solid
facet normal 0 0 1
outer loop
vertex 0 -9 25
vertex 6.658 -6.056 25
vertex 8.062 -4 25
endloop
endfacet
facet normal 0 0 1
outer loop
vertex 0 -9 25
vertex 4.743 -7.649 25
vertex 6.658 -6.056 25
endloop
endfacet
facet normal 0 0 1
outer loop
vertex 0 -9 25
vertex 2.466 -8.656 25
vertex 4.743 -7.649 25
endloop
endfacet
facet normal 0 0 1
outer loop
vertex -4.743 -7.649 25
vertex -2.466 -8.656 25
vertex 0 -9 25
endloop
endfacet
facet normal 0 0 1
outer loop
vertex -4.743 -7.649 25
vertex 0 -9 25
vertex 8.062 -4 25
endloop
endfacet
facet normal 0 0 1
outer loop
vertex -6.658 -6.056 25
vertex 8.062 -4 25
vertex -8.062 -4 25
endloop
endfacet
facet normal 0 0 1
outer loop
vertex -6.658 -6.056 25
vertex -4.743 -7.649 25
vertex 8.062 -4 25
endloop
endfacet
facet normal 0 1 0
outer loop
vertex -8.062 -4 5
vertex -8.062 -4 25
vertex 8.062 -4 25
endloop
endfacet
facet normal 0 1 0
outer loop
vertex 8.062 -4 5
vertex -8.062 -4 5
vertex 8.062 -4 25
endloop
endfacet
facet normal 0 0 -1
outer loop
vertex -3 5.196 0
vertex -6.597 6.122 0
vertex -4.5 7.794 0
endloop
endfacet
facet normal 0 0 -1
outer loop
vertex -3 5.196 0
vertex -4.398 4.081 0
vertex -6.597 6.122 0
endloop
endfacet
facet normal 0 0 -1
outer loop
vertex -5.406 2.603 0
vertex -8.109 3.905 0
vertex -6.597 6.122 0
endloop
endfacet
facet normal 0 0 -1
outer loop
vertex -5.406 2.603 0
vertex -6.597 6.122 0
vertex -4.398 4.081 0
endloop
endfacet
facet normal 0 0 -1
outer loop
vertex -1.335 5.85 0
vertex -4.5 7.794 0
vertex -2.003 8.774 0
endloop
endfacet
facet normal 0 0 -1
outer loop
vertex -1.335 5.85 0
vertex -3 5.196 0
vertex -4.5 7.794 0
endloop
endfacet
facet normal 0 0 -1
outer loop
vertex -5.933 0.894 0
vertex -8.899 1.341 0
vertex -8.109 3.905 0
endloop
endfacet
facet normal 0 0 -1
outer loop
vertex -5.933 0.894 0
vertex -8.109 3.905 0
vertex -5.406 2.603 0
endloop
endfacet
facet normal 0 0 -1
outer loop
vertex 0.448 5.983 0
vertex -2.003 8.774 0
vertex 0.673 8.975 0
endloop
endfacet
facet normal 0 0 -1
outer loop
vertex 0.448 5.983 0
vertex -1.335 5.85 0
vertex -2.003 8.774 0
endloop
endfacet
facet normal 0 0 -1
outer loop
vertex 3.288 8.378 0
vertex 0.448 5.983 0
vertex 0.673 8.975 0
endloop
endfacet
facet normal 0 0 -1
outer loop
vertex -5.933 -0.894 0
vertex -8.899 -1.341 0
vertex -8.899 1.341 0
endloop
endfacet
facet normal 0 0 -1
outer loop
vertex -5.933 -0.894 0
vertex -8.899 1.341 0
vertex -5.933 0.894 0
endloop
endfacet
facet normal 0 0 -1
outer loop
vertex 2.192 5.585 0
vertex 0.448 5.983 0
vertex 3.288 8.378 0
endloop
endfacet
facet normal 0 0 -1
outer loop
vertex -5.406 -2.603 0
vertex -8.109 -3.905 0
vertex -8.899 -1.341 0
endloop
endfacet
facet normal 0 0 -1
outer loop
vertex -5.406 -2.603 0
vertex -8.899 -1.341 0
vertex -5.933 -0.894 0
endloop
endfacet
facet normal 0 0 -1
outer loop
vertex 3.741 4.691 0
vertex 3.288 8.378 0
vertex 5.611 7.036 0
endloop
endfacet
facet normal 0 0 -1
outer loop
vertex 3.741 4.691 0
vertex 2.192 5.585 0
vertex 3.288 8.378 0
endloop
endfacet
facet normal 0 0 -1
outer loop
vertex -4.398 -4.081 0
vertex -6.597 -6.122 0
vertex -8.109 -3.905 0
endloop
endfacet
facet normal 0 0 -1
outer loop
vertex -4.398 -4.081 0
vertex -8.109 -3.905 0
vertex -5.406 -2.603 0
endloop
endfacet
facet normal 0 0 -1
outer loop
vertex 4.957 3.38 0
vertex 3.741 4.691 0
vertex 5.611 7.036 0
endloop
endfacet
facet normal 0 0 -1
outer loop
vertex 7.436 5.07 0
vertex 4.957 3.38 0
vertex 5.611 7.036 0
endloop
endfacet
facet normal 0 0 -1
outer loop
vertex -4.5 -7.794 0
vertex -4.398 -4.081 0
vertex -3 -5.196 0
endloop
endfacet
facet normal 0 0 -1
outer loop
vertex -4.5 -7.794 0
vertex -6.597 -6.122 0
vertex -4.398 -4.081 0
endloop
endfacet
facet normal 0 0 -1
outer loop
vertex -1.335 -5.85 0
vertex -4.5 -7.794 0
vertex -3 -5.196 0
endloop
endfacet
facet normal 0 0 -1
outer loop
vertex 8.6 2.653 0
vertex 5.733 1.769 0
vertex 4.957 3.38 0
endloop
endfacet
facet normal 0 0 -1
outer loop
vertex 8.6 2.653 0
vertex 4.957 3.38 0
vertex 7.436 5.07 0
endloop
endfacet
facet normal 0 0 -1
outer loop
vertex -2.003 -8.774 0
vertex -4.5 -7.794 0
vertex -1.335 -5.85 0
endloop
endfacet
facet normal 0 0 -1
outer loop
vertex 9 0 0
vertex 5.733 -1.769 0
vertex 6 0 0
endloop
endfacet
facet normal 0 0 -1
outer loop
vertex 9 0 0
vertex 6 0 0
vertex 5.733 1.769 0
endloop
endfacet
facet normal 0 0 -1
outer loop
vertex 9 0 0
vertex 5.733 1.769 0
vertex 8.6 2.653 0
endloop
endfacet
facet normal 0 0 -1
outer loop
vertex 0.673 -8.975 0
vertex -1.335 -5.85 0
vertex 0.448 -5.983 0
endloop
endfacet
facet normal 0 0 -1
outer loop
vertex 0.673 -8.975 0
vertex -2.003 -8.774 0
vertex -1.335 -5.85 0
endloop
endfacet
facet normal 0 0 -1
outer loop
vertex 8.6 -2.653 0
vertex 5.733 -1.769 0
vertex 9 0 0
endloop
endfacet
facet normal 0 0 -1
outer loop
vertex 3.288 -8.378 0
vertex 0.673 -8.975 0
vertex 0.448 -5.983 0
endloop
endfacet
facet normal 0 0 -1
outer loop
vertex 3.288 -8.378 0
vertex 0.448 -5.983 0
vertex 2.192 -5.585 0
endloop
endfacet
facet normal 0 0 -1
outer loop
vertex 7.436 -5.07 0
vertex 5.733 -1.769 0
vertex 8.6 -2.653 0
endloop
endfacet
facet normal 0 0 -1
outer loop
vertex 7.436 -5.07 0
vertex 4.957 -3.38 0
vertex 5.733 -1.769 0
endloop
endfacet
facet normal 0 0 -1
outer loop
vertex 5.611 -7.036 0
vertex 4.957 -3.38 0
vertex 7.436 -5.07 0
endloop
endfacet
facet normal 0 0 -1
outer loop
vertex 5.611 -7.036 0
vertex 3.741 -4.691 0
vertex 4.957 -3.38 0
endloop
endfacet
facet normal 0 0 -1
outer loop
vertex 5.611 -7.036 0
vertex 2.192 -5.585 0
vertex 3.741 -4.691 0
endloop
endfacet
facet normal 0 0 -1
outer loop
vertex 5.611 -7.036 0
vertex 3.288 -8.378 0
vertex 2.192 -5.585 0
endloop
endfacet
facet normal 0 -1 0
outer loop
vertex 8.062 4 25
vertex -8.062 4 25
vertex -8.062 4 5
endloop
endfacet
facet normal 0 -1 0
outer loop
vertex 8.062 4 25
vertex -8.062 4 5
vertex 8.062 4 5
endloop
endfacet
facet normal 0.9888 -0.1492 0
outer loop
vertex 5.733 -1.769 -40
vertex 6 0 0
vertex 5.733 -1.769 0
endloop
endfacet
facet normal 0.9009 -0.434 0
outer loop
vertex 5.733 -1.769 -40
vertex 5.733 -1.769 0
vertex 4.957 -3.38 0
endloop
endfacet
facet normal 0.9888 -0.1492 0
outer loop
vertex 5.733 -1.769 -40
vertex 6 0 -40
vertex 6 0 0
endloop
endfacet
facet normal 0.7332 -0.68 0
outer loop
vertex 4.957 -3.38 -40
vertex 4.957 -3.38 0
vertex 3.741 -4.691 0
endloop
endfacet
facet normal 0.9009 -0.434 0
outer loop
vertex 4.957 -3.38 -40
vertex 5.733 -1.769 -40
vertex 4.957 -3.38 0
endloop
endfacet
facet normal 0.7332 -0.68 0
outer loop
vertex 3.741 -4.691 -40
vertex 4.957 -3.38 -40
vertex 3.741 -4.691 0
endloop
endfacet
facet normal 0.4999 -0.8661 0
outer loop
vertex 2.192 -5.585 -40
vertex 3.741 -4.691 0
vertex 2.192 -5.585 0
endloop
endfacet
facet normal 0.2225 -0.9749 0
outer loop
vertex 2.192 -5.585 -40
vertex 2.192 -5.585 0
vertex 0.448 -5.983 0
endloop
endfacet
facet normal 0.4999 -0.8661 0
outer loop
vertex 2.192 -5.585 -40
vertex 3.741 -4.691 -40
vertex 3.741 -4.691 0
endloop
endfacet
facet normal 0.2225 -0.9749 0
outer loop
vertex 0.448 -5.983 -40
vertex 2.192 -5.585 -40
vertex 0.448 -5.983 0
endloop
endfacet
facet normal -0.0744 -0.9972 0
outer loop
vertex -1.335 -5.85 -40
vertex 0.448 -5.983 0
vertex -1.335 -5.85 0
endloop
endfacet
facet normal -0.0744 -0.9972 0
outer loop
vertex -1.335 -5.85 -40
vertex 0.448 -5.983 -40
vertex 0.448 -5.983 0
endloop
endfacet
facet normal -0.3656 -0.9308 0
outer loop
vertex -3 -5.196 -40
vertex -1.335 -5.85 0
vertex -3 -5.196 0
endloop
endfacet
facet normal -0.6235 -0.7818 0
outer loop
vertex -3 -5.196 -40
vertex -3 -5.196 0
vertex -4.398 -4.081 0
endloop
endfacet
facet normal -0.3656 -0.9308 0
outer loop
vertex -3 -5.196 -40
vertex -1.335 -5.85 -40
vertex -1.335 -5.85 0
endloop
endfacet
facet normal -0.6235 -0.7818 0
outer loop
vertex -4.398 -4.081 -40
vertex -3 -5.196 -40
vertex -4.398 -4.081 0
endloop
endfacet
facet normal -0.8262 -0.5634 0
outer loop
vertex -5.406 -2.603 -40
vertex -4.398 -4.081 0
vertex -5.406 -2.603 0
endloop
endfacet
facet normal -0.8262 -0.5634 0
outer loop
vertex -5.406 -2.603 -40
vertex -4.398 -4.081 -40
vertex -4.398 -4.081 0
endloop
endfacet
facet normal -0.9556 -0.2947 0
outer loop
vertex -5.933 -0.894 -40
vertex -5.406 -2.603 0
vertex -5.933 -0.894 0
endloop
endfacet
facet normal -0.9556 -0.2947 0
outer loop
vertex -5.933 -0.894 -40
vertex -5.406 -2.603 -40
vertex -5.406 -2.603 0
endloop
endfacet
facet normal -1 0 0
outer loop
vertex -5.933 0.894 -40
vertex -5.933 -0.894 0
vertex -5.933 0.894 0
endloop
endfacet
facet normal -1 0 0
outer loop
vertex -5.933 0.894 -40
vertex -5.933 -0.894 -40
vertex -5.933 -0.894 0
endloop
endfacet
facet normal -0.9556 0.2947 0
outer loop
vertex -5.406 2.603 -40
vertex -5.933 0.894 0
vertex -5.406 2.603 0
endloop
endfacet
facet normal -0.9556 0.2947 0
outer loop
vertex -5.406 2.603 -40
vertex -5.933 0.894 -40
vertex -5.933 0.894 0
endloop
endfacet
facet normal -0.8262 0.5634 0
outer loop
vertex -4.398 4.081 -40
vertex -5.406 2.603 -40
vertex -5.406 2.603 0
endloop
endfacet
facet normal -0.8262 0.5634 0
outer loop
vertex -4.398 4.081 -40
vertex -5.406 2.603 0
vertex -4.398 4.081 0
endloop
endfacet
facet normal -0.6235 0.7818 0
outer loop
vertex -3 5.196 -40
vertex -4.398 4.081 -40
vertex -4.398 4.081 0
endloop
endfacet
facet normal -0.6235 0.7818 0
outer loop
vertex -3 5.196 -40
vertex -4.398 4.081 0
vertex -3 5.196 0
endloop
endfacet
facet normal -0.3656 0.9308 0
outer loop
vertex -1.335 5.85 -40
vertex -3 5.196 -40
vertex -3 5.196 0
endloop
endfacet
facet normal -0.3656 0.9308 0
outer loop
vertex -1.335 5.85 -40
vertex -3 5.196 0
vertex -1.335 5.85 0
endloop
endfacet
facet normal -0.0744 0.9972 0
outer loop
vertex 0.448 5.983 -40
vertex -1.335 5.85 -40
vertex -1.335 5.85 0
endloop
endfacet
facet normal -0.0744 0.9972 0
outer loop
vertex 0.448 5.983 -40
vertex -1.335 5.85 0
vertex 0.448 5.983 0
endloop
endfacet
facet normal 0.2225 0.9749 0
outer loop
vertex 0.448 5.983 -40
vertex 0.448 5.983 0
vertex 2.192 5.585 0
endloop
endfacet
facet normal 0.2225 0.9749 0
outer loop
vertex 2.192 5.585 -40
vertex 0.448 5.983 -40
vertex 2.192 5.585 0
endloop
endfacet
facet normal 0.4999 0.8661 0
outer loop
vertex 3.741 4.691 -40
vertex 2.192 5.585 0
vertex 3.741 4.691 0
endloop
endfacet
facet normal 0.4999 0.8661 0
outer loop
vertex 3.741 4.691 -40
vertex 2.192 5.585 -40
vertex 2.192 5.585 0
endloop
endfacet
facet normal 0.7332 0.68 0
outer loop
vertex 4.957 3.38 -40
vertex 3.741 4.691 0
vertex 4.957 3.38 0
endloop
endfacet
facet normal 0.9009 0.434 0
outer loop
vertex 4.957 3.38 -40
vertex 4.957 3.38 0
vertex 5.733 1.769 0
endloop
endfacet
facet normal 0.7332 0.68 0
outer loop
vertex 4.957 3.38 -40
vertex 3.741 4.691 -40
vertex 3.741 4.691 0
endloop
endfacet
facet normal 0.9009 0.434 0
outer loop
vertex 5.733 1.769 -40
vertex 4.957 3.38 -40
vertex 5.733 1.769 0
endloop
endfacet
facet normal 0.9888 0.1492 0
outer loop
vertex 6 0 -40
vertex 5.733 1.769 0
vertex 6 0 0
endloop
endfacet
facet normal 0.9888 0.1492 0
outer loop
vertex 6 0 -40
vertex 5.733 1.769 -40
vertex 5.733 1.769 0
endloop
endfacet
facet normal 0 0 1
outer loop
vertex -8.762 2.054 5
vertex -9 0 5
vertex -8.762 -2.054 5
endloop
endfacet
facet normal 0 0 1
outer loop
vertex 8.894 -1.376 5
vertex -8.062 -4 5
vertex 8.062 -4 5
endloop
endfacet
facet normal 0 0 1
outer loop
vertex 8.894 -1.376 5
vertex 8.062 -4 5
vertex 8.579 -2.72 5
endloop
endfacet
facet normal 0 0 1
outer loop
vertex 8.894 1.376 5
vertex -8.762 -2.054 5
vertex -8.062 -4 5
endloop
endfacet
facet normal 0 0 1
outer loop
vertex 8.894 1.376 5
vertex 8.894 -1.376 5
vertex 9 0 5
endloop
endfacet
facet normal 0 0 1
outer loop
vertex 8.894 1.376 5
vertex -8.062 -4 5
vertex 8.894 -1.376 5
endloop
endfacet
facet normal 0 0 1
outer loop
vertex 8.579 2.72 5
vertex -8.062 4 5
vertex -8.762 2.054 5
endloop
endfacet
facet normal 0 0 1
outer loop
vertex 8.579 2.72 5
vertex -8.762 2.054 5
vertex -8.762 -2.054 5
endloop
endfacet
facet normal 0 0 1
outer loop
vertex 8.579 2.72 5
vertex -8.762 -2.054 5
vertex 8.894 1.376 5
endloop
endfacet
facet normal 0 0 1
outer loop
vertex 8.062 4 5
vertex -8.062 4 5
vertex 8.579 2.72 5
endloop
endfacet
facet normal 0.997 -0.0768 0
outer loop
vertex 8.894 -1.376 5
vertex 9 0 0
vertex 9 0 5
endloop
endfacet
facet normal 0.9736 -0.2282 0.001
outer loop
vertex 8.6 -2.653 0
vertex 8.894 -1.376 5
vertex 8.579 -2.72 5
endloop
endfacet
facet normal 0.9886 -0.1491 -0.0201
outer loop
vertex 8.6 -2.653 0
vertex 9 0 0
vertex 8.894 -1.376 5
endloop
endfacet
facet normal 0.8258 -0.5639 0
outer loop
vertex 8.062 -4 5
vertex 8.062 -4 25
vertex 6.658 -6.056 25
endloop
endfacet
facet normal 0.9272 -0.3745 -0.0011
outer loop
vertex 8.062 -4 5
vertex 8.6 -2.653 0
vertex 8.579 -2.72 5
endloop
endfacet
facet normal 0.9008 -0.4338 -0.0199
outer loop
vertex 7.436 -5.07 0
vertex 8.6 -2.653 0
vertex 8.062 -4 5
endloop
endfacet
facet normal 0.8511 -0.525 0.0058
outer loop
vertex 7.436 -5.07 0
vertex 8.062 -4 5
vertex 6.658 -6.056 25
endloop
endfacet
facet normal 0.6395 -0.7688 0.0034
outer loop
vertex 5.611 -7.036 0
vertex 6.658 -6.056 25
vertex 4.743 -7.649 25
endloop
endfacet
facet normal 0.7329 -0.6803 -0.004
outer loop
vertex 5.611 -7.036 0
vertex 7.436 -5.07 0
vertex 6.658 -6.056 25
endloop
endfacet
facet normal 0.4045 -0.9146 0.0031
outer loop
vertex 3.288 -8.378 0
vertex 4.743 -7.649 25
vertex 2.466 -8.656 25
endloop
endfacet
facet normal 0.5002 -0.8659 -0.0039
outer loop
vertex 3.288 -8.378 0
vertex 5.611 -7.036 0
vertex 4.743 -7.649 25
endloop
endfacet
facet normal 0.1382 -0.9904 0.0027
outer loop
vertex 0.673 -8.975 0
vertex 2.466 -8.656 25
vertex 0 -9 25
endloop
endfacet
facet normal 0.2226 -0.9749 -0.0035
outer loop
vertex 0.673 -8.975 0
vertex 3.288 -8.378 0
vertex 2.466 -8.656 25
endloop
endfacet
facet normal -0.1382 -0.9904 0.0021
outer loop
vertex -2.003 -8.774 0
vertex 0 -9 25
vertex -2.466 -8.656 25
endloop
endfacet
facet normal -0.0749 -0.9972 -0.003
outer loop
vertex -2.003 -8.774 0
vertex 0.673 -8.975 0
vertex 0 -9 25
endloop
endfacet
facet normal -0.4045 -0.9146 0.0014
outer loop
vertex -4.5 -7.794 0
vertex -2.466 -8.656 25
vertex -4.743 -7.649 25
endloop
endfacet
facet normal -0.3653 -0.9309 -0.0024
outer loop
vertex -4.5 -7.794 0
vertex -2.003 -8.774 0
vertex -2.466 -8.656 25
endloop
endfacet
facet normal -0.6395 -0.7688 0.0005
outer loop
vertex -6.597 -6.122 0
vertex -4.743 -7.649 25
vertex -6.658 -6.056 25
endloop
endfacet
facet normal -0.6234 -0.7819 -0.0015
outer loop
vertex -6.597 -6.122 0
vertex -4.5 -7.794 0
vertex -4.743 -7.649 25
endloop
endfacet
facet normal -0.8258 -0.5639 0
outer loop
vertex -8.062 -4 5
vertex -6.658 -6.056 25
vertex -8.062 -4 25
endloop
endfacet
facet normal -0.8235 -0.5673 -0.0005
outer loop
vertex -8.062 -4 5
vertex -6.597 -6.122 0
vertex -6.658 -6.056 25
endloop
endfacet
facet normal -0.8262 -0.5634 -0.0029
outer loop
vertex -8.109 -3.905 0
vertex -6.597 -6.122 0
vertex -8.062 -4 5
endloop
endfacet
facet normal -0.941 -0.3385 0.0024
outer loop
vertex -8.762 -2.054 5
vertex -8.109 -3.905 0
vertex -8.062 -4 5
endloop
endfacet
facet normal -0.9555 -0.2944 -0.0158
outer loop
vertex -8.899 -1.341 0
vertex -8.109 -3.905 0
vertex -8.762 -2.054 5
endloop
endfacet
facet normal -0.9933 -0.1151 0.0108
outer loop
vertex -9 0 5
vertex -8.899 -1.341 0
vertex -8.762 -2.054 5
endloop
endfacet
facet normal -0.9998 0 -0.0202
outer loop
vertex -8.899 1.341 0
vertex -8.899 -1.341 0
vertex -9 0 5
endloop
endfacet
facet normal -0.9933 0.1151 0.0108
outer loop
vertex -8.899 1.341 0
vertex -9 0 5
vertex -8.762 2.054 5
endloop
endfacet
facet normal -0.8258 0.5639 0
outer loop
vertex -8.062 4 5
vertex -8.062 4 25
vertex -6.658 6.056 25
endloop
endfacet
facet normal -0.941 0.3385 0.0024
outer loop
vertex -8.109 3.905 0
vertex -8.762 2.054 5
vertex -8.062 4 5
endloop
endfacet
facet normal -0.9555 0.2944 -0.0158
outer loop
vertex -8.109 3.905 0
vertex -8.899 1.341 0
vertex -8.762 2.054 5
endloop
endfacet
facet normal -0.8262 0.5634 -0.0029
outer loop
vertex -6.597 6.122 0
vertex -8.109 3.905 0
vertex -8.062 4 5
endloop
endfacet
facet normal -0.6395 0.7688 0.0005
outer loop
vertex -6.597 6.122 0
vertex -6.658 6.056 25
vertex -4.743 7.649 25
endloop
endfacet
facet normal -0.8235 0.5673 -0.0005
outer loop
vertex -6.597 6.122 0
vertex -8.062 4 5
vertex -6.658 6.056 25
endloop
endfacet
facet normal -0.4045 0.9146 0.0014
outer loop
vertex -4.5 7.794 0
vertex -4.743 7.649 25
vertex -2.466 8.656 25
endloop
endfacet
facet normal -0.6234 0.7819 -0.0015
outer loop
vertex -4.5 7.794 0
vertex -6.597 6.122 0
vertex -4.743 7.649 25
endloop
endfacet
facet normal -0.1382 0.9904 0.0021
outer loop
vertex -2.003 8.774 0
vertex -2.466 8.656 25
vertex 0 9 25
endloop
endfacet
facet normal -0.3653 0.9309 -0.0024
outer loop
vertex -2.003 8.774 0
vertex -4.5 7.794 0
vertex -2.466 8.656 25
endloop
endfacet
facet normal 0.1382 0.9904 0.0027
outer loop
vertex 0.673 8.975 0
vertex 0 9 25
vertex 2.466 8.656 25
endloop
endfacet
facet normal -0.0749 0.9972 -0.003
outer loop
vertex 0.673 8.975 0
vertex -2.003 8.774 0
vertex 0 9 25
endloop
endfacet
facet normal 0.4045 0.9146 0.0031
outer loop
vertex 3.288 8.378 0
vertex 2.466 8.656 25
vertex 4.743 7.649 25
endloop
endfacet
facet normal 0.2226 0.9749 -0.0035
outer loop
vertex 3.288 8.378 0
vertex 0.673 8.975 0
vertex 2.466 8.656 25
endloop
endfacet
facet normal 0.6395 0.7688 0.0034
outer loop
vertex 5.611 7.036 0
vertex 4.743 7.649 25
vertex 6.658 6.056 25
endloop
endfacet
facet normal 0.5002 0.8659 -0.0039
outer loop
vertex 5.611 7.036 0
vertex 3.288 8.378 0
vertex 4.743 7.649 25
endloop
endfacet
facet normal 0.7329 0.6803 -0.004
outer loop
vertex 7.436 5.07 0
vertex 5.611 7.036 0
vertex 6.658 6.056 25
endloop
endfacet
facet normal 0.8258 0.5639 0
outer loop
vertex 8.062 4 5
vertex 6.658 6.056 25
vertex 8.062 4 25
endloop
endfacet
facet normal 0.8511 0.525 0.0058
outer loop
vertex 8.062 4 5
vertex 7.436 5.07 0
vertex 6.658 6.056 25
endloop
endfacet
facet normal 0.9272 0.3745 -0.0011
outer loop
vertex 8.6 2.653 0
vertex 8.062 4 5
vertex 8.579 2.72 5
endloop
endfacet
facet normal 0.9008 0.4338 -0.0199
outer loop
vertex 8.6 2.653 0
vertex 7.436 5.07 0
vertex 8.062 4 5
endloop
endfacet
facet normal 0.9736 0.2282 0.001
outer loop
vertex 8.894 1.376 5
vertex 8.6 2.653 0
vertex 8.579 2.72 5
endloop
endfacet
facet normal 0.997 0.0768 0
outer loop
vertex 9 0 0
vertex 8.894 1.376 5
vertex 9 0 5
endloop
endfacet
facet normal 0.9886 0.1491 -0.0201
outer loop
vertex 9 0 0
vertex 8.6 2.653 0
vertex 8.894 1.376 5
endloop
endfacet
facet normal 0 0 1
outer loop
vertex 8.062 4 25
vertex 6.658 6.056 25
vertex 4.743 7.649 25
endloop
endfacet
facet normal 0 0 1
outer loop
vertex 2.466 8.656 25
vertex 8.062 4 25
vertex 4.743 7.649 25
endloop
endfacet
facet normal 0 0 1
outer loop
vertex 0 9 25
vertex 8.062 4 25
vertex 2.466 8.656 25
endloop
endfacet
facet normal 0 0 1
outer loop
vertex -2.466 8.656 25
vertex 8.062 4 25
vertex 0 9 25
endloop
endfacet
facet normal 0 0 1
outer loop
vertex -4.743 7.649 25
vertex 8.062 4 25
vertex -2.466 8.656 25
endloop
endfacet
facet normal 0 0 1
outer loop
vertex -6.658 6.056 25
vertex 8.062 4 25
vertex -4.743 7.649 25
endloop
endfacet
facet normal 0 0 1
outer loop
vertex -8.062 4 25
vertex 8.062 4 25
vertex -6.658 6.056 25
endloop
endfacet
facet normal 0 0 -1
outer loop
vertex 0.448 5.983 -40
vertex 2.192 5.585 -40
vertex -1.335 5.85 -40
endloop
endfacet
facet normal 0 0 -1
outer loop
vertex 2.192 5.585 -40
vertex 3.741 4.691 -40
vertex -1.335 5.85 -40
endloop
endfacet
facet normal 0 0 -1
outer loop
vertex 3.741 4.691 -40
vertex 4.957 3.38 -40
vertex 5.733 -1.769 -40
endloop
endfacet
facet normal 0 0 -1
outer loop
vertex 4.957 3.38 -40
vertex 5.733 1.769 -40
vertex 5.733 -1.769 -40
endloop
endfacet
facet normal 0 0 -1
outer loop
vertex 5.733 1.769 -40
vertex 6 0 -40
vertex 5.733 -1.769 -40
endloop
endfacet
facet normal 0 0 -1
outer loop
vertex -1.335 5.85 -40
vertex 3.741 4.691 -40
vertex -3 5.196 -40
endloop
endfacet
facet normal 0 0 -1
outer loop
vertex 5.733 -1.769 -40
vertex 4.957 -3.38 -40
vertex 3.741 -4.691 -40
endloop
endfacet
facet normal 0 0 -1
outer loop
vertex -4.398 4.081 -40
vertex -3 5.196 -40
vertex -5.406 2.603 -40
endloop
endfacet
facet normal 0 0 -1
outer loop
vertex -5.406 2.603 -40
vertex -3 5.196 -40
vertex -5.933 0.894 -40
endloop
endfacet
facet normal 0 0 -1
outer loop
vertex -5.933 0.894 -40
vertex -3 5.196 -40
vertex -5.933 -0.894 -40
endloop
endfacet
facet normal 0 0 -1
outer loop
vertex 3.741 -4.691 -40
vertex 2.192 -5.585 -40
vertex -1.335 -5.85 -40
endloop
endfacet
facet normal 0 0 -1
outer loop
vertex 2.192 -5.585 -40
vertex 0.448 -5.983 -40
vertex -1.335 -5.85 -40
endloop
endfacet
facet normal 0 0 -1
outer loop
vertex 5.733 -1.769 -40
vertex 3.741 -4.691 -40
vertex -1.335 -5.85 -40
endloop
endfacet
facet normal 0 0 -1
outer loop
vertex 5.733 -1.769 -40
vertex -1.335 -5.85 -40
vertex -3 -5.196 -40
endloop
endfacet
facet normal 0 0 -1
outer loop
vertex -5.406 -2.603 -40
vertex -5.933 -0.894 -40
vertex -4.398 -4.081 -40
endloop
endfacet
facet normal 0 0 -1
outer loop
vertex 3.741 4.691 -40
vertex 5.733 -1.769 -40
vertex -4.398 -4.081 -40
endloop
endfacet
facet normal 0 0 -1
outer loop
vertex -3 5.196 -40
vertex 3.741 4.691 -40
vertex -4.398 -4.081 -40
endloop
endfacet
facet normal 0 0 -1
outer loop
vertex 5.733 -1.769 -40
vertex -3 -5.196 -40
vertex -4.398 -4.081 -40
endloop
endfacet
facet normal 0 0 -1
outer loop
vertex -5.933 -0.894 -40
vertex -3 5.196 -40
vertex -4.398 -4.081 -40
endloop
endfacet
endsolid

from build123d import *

# Parameters (mm, degrees)
SZKIC1_W                   = 6
SZKIC1_H                   = 40
SZKIC2_W                   = 18
SZKIC2_H                   = 8
WYTNIJ_WYCI_GNI_CIE1_DEPTH = 20


with BuildPart() as part:
    # Szkic1 → Obrót1 (revolve)
    with BuildSketch(Plane(origin=(0, 0, 0), x_dir=(1, 0, 0), z_dir=(0, 1, 0))):
        with Locations((3, 20)):
            Rectangle(SZKIC1_W, SZKIC1_H)
        Polygon((0, 0), (0, -25), (9, -25), (9, 0), (6, 0), align=None)
    revolve(axis=Axis((0, 0, 44.409951059), (0, 0, -1)))

    # Szkic2 → Wytnij-wyciągnięcie1 (cut)
    with BuildSketch(Plane.XY.offset(25)):
        Rectangle(SZKIC2_W, SZKIC2_H)
    extrude(amount=-WYTNIJ_WYCI_GNI_CIE1_DEPTH, mode=Mode.SUBTRACT)


solid = part.part
